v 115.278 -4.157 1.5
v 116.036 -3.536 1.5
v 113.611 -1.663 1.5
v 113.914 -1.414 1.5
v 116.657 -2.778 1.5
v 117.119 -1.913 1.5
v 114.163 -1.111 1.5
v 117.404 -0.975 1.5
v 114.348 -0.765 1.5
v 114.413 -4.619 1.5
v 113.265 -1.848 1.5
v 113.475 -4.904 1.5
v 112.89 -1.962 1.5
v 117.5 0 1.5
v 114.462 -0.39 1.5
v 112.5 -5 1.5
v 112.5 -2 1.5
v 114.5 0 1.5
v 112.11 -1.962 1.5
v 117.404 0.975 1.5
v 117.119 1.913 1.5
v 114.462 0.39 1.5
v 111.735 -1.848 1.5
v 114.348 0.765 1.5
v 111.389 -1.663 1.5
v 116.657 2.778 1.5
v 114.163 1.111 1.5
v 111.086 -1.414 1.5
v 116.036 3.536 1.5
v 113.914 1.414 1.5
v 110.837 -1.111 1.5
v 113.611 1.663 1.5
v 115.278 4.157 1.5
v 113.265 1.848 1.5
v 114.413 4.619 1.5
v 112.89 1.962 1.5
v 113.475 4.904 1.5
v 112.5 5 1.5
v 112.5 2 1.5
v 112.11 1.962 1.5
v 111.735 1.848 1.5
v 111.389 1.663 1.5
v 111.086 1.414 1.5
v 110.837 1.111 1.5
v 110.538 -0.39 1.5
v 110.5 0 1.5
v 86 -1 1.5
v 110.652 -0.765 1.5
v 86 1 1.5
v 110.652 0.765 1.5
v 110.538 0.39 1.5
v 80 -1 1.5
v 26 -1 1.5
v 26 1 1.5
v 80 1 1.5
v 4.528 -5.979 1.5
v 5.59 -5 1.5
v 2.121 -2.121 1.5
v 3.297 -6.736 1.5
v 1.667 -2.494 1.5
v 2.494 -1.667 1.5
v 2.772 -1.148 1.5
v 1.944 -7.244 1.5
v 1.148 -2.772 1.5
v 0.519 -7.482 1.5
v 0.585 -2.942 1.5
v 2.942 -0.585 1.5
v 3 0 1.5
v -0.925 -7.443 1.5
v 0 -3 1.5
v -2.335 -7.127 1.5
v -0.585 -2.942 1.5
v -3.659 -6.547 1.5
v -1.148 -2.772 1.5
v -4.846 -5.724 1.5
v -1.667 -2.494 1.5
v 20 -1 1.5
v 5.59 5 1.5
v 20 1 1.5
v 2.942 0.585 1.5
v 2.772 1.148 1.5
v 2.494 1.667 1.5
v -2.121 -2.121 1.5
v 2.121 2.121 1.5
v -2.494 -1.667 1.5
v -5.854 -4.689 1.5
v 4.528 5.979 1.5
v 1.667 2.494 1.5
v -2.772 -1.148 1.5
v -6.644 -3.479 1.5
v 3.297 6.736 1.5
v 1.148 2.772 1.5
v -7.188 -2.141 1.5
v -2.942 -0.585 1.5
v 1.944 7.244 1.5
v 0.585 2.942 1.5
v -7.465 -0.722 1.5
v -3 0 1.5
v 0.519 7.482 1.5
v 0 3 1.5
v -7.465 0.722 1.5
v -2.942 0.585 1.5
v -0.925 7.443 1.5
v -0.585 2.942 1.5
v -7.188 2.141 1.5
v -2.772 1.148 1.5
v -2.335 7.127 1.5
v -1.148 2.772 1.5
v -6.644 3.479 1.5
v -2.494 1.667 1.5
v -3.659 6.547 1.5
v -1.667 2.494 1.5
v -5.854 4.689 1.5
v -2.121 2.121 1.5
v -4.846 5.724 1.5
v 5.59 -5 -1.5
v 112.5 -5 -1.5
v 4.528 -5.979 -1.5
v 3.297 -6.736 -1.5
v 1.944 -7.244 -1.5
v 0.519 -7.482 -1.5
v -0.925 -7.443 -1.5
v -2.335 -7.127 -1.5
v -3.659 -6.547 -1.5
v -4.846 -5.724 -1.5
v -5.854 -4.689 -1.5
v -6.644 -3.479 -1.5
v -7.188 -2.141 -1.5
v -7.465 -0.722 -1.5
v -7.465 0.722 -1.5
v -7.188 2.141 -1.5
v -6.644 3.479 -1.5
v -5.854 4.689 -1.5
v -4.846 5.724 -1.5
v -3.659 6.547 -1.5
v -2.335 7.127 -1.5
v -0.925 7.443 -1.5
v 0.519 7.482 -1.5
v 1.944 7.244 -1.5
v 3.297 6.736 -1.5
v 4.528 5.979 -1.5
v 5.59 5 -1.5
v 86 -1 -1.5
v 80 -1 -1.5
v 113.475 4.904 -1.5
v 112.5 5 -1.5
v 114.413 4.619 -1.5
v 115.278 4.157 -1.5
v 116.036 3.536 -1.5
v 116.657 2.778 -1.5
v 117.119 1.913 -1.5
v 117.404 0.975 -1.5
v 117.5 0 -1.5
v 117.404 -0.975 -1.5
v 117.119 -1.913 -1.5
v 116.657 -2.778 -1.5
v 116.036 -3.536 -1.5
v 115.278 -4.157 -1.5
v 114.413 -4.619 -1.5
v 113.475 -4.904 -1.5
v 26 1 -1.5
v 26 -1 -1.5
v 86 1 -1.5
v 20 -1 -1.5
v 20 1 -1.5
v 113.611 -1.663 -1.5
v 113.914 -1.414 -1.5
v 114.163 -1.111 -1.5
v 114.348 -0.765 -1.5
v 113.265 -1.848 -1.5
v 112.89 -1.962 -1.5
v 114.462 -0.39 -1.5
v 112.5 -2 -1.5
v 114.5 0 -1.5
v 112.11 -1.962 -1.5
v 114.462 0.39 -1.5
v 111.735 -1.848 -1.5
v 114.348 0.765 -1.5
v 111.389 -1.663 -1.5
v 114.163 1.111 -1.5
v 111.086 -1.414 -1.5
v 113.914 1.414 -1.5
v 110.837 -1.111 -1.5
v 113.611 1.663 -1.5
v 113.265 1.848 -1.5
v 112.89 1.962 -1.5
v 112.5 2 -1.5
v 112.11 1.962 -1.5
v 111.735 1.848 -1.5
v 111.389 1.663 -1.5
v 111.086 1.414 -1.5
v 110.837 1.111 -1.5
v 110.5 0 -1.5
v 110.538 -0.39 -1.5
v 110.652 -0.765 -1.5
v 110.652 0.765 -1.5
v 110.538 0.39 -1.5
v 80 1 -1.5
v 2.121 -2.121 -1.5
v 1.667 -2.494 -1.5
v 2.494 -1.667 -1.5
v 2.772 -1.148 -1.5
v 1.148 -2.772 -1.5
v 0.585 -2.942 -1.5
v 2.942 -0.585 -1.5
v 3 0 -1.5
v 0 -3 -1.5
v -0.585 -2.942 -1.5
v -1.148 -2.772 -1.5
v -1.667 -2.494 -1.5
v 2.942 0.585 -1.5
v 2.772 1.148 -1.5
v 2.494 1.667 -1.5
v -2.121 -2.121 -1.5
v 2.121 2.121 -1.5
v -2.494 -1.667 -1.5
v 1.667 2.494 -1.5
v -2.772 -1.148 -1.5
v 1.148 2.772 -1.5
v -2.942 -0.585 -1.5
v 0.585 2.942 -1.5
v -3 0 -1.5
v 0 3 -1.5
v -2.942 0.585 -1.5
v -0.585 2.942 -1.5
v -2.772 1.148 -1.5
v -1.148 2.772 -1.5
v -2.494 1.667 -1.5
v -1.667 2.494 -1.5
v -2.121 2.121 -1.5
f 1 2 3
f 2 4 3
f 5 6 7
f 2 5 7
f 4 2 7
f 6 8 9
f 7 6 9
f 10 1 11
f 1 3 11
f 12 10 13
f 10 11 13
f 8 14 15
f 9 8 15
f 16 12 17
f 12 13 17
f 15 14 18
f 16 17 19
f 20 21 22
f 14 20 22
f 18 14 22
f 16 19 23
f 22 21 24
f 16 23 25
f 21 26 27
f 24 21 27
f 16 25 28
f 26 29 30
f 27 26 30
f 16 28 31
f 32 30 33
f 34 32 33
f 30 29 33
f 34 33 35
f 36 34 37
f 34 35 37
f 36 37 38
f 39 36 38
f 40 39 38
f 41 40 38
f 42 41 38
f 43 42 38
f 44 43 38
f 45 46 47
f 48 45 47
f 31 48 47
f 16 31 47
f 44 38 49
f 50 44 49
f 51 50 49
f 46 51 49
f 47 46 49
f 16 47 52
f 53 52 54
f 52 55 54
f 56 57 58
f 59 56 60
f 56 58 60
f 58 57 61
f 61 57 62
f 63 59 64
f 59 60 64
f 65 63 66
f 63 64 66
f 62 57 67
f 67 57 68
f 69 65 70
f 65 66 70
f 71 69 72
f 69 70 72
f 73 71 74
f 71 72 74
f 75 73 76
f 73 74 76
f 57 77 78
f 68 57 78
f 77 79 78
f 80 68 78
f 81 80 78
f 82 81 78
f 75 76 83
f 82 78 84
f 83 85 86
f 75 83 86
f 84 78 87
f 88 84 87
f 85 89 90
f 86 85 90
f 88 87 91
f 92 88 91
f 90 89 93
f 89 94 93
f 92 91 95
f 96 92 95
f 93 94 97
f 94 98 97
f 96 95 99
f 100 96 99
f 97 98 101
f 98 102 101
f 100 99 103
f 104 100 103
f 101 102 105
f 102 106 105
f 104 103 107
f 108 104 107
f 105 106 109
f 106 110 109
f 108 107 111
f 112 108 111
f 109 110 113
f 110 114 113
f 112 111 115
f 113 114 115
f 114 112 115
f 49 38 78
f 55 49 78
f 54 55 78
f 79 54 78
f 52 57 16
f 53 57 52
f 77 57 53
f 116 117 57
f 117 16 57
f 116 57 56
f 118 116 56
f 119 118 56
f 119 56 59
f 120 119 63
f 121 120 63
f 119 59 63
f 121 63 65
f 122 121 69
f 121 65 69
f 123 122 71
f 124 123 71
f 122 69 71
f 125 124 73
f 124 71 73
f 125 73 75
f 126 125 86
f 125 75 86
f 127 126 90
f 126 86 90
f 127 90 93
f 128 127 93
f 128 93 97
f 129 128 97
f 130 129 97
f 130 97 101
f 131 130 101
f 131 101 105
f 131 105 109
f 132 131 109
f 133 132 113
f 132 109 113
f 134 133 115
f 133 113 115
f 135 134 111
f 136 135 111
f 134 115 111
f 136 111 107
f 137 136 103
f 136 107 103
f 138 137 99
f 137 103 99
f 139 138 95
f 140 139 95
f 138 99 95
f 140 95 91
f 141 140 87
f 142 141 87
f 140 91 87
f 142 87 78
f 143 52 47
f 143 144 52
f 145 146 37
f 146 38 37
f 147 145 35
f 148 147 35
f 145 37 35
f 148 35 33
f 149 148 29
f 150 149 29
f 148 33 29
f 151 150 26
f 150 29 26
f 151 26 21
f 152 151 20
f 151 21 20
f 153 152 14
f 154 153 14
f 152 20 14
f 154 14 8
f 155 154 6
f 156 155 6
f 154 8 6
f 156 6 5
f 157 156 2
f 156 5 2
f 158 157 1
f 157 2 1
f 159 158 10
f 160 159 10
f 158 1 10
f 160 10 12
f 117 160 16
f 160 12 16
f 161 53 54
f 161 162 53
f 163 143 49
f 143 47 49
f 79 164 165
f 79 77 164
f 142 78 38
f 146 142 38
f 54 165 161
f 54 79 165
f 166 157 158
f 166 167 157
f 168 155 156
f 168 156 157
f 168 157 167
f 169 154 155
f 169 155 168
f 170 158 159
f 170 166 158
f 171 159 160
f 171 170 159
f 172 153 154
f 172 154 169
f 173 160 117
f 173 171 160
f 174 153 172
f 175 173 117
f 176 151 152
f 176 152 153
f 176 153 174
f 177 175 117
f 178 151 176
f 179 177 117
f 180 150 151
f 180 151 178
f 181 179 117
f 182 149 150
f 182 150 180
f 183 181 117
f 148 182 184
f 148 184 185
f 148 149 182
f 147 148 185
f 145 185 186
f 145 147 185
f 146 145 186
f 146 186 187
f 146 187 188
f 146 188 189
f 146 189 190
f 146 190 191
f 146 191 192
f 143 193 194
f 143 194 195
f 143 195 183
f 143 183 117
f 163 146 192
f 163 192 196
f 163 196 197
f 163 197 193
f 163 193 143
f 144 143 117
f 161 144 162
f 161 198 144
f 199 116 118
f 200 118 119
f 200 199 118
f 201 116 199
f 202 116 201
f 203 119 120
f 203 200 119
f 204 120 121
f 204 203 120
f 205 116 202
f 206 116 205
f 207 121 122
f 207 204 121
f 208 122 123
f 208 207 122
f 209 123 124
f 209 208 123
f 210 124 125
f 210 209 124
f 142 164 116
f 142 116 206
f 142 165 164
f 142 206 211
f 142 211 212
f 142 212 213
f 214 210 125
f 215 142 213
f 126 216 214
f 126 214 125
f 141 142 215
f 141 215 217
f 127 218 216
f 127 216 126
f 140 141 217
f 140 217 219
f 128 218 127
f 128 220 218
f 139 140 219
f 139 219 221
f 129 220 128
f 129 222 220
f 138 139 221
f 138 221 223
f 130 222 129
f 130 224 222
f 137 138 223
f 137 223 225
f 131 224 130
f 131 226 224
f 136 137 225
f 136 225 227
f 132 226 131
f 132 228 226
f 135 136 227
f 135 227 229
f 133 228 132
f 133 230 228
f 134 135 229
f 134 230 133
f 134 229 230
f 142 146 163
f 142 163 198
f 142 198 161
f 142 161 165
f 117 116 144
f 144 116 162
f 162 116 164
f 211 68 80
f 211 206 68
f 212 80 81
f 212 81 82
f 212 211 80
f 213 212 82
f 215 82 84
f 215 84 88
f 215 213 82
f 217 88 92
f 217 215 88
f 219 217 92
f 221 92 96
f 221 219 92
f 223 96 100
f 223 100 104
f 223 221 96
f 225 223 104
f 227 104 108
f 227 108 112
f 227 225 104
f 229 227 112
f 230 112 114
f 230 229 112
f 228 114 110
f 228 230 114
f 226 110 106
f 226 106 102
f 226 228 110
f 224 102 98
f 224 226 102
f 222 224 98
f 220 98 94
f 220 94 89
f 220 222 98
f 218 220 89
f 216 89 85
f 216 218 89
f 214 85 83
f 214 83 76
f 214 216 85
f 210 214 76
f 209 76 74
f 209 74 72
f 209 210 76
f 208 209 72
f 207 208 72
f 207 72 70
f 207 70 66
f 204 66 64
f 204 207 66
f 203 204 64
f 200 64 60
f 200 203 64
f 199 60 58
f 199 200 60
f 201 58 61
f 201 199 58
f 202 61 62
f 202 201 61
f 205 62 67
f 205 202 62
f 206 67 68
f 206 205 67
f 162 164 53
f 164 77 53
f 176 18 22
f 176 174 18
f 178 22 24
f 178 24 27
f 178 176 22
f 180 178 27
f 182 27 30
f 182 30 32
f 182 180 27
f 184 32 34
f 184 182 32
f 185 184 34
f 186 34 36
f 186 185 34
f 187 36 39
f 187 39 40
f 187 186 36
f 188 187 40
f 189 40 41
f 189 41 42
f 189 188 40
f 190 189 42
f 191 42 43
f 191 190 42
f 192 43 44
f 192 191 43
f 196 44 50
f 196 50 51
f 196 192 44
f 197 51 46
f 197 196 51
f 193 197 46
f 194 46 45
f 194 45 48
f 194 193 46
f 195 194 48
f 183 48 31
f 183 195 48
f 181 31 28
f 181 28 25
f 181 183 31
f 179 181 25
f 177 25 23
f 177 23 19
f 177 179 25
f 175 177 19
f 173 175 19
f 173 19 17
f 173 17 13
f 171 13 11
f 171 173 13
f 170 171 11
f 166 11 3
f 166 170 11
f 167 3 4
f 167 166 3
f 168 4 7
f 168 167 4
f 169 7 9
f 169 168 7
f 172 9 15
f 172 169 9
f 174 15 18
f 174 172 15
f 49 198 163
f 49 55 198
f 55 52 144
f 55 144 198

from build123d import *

# Parameters (mm, degrees)
SKETCH_1_R      = 2
SKETCH_1_R_2    = 3
SKETCH_1_W      = 6
SKETCH_1_H      = 2
EXTRUDE_1_DEPTH = 1.5


with BuildPart() as part:
    # 草图1 → 凸台-拉伸1 (new, symmetric)
    with BuildSketch(Plane.XY):
        with BuildLine():
            Line((5.590169944, 5), (112.5, 5))
            ThreePointArc((112.5, 5), (117.5, 0), (112.5, -5))
            Line((112.5, -5), (5.590169944, -5))
            ThreePointArc((5.590169944, -5), (-7.5, 0), (5.590169944, 5))
        make_face()
        with Locations((112.5, 0)):
            Circle(SKETCH_1_R, mode=Mode.SUBTRACT)
        Circle(SKETCH_1_R_2, mode=Mode.SUBTRACT)
        with Locations((23, 0)):
            Rectangle(SKETCH_1_W, SKETCH_1_H, mode=Mode.SUBTRACT)
        with Locations((83, 0)):
            Rectangle(SKETCH_1_W, SKETCH_1_H, mode=Mode.SUBTRACT)
    extrude(amount=EXTRUDE_1_DEPTH, both=True)


solid = part.part
